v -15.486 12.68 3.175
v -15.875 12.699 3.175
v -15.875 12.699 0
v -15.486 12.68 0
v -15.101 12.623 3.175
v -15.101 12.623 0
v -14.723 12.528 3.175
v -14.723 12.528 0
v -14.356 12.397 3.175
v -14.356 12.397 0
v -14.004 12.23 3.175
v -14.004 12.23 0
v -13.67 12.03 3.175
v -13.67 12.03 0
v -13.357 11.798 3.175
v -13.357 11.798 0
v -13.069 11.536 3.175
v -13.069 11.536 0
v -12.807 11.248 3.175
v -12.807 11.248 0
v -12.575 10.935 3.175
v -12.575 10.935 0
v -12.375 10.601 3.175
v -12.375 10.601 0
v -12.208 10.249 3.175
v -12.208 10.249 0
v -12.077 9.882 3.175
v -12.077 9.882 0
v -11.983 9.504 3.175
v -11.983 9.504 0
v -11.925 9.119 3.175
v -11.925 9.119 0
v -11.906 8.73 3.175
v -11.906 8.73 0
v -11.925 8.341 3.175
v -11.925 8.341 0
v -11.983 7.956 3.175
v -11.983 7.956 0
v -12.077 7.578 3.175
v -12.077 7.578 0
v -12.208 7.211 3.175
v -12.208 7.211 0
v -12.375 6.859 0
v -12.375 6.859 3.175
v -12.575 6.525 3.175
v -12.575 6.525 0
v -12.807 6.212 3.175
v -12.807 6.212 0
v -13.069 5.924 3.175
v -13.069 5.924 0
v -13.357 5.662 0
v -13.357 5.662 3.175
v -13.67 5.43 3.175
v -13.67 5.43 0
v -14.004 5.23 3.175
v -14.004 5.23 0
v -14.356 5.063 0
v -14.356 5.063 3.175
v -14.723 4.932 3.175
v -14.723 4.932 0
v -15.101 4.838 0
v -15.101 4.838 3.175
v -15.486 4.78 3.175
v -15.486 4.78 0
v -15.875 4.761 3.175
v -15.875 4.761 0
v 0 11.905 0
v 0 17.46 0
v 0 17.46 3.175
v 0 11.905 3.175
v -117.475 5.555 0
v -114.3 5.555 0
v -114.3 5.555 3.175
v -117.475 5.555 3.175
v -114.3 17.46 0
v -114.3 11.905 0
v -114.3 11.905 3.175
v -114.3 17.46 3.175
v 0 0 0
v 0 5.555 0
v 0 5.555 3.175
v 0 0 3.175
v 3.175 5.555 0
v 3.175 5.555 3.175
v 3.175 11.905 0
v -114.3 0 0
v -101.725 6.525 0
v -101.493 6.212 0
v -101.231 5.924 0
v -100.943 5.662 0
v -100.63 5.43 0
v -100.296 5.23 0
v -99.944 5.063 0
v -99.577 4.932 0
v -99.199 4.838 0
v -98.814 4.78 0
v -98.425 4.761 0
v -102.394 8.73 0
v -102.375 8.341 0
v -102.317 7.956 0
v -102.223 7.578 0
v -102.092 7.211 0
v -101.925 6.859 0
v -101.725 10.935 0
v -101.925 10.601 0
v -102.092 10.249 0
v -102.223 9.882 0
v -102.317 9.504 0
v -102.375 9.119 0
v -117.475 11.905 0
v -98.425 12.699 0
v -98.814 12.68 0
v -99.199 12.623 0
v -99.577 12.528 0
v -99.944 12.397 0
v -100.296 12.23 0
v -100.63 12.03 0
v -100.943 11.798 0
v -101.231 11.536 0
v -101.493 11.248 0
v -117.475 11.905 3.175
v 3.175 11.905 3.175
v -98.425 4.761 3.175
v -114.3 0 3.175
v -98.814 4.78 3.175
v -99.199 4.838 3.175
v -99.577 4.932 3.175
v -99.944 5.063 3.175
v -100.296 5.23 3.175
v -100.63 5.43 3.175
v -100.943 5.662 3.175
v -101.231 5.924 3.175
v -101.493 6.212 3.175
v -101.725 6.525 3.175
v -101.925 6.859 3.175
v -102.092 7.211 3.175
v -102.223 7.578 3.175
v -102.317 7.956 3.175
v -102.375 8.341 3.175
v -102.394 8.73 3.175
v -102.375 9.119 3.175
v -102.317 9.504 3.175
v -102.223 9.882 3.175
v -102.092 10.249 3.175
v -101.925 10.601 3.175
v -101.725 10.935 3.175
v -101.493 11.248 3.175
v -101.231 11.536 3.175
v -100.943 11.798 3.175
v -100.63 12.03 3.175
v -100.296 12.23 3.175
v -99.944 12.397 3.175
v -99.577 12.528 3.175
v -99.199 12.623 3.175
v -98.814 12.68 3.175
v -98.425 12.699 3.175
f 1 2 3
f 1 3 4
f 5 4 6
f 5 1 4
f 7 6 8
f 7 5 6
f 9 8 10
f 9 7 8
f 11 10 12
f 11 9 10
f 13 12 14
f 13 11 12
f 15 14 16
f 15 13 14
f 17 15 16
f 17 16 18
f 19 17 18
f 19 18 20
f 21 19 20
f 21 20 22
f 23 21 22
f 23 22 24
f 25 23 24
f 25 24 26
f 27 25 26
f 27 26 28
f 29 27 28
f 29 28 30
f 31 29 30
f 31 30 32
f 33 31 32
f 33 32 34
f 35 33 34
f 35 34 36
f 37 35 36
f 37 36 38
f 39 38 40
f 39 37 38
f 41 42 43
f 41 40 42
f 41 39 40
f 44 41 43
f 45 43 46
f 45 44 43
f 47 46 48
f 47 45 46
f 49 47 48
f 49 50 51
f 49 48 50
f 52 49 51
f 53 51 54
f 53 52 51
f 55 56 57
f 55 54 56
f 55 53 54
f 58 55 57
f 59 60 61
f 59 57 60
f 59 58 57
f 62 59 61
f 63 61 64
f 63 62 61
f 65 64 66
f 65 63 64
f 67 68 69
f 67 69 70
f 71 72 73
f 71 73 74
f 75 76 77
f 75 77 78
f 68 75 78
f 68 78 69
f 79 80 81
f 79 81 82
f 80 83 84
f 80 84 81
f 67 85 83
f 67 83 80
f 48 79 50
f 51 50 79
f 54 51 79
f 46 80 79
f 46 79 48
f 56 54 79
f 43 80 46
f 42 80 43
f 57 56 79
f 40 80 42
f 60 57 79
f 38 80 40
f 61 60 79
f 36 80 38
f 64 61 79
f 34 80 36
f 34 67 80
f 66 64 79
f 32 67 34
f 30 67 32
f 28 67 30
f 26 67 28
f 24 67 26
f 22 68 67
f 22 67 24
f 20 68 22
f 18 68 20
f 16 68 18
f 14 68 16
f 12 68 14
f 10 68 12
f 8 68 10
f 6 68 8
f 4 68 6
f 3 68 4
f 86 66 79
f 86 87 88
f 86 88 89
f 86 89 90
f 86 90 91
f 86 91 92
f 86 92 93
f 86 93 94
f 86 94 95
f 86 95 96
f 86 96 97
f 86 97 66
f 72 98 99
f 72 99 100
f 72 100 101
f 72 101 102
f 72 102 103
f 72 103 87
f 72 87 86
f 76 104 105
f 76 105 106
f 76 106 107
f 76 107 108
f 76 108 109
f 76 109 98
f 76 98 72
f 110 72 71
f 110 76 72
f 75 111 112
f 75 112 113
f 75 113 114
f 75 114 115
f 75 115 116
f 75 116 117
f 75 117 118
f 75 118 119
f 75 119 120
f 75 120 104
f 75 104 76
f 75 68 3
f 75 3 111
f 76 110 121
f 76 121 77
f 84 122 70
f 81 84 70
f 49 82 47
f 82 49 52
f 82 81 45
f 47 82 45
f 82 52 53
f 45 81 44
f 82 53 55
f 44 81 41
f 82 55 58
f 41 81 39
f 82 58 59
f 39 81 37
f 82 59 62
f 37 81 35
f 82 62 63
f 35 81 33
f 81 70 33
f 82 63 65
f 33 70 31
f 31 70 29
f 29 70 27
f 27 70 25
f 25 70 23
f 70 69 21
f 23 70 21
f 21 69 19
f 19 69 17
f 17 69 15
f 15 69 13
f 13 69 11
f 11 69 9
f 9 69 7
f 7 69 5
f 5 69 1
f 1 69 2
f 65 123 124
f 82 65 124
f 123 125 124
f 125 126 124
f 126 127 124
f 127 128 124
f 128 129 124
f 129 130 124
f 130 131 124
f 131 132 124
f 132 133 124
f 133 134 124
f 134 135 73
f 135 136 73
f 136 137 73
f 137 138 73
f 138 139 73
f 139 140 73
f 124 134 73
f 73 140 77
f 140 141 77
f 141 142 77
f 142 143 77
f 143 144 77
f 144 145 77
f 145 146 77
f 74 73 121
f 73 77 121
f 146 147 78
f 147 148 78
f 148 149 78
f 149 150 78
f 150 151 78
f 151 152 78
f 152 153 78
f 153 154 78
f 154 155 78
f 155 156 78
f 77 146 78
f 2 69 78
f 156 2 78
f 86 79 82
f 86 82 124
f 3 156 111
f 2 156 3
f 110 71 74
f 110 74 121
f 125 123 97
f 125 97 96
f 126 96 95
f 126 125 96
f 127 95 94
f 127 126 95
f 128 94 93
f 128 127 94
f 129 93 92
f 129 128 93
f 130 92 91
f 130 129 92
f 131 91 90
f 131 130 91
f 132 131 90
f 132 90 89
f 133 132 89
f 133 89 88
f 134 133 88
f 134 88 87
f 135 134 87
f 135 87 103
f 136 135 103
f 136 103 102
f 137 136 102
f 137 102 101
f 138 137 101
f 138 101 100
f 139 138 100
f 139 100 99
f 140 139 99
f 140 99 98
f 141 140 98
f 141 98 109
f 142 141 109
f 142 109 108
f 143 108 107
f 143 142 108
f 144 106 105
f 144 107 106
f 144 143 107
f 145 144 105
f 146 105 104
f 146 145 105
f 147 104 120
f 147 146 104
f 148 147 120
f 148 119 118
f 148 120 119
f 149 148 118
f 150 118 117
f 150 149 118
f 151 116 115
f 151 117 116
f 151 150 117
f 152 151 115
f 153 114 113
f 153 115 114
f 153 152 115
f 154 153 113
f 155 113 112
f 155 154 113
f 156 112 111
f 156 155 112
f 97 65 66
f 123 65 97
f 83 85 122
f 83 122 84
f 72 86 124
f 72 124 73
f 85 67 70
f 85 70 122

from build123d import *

# Parameters (mm, degrees)
BOSS_EXTRUDE1_DEPTH = 3.175
CUT_EXTRUDE2_DEPTH  = 4.175


with BuildPart() as part:
    # Sketch1 → Boss-Extrude1 (new body)
    with BuildSketch(Plane.XY):
        Polygon((0, 0), (-114.3, 0), (-114.3, 5.555107), (-117.475, 5.555107), (-117.475, 11.905107), (-114.3, 11.905107), (-114.3, 17.460214), (0, 17.460214), (0, 11.905107), (3.175, 11.905107), (3.175, 5.555107), (0, 5.555107), align=None)
    extrude(amount=BOSS_EXTRUDE1_DEPTH)

    # Sketch3 → Cut-Extrude2 (cut, through all)
    with BuildSketch(Plane.XY.offset(3.175)):
        with BuildLine():
            Line((-15.875, 4.761357), (-98.425, 4.761357))
            ThreePointArc((-98.425, 4.761357), (-102.39375, 8.730107), (-98.425, 12.698857))
            Line((-98.425, 12.698857), (-15.875, 12.698857))
            ThreePointArc((-15.875, 12.698857), (-11.90625, 8.730107), (-15.875, 4.761357))
        make_face()
    extrude(amount=-CUT_EXTRUDE2_DEPTH, mode=Mode.SUBTRACT)


solid = part.part
